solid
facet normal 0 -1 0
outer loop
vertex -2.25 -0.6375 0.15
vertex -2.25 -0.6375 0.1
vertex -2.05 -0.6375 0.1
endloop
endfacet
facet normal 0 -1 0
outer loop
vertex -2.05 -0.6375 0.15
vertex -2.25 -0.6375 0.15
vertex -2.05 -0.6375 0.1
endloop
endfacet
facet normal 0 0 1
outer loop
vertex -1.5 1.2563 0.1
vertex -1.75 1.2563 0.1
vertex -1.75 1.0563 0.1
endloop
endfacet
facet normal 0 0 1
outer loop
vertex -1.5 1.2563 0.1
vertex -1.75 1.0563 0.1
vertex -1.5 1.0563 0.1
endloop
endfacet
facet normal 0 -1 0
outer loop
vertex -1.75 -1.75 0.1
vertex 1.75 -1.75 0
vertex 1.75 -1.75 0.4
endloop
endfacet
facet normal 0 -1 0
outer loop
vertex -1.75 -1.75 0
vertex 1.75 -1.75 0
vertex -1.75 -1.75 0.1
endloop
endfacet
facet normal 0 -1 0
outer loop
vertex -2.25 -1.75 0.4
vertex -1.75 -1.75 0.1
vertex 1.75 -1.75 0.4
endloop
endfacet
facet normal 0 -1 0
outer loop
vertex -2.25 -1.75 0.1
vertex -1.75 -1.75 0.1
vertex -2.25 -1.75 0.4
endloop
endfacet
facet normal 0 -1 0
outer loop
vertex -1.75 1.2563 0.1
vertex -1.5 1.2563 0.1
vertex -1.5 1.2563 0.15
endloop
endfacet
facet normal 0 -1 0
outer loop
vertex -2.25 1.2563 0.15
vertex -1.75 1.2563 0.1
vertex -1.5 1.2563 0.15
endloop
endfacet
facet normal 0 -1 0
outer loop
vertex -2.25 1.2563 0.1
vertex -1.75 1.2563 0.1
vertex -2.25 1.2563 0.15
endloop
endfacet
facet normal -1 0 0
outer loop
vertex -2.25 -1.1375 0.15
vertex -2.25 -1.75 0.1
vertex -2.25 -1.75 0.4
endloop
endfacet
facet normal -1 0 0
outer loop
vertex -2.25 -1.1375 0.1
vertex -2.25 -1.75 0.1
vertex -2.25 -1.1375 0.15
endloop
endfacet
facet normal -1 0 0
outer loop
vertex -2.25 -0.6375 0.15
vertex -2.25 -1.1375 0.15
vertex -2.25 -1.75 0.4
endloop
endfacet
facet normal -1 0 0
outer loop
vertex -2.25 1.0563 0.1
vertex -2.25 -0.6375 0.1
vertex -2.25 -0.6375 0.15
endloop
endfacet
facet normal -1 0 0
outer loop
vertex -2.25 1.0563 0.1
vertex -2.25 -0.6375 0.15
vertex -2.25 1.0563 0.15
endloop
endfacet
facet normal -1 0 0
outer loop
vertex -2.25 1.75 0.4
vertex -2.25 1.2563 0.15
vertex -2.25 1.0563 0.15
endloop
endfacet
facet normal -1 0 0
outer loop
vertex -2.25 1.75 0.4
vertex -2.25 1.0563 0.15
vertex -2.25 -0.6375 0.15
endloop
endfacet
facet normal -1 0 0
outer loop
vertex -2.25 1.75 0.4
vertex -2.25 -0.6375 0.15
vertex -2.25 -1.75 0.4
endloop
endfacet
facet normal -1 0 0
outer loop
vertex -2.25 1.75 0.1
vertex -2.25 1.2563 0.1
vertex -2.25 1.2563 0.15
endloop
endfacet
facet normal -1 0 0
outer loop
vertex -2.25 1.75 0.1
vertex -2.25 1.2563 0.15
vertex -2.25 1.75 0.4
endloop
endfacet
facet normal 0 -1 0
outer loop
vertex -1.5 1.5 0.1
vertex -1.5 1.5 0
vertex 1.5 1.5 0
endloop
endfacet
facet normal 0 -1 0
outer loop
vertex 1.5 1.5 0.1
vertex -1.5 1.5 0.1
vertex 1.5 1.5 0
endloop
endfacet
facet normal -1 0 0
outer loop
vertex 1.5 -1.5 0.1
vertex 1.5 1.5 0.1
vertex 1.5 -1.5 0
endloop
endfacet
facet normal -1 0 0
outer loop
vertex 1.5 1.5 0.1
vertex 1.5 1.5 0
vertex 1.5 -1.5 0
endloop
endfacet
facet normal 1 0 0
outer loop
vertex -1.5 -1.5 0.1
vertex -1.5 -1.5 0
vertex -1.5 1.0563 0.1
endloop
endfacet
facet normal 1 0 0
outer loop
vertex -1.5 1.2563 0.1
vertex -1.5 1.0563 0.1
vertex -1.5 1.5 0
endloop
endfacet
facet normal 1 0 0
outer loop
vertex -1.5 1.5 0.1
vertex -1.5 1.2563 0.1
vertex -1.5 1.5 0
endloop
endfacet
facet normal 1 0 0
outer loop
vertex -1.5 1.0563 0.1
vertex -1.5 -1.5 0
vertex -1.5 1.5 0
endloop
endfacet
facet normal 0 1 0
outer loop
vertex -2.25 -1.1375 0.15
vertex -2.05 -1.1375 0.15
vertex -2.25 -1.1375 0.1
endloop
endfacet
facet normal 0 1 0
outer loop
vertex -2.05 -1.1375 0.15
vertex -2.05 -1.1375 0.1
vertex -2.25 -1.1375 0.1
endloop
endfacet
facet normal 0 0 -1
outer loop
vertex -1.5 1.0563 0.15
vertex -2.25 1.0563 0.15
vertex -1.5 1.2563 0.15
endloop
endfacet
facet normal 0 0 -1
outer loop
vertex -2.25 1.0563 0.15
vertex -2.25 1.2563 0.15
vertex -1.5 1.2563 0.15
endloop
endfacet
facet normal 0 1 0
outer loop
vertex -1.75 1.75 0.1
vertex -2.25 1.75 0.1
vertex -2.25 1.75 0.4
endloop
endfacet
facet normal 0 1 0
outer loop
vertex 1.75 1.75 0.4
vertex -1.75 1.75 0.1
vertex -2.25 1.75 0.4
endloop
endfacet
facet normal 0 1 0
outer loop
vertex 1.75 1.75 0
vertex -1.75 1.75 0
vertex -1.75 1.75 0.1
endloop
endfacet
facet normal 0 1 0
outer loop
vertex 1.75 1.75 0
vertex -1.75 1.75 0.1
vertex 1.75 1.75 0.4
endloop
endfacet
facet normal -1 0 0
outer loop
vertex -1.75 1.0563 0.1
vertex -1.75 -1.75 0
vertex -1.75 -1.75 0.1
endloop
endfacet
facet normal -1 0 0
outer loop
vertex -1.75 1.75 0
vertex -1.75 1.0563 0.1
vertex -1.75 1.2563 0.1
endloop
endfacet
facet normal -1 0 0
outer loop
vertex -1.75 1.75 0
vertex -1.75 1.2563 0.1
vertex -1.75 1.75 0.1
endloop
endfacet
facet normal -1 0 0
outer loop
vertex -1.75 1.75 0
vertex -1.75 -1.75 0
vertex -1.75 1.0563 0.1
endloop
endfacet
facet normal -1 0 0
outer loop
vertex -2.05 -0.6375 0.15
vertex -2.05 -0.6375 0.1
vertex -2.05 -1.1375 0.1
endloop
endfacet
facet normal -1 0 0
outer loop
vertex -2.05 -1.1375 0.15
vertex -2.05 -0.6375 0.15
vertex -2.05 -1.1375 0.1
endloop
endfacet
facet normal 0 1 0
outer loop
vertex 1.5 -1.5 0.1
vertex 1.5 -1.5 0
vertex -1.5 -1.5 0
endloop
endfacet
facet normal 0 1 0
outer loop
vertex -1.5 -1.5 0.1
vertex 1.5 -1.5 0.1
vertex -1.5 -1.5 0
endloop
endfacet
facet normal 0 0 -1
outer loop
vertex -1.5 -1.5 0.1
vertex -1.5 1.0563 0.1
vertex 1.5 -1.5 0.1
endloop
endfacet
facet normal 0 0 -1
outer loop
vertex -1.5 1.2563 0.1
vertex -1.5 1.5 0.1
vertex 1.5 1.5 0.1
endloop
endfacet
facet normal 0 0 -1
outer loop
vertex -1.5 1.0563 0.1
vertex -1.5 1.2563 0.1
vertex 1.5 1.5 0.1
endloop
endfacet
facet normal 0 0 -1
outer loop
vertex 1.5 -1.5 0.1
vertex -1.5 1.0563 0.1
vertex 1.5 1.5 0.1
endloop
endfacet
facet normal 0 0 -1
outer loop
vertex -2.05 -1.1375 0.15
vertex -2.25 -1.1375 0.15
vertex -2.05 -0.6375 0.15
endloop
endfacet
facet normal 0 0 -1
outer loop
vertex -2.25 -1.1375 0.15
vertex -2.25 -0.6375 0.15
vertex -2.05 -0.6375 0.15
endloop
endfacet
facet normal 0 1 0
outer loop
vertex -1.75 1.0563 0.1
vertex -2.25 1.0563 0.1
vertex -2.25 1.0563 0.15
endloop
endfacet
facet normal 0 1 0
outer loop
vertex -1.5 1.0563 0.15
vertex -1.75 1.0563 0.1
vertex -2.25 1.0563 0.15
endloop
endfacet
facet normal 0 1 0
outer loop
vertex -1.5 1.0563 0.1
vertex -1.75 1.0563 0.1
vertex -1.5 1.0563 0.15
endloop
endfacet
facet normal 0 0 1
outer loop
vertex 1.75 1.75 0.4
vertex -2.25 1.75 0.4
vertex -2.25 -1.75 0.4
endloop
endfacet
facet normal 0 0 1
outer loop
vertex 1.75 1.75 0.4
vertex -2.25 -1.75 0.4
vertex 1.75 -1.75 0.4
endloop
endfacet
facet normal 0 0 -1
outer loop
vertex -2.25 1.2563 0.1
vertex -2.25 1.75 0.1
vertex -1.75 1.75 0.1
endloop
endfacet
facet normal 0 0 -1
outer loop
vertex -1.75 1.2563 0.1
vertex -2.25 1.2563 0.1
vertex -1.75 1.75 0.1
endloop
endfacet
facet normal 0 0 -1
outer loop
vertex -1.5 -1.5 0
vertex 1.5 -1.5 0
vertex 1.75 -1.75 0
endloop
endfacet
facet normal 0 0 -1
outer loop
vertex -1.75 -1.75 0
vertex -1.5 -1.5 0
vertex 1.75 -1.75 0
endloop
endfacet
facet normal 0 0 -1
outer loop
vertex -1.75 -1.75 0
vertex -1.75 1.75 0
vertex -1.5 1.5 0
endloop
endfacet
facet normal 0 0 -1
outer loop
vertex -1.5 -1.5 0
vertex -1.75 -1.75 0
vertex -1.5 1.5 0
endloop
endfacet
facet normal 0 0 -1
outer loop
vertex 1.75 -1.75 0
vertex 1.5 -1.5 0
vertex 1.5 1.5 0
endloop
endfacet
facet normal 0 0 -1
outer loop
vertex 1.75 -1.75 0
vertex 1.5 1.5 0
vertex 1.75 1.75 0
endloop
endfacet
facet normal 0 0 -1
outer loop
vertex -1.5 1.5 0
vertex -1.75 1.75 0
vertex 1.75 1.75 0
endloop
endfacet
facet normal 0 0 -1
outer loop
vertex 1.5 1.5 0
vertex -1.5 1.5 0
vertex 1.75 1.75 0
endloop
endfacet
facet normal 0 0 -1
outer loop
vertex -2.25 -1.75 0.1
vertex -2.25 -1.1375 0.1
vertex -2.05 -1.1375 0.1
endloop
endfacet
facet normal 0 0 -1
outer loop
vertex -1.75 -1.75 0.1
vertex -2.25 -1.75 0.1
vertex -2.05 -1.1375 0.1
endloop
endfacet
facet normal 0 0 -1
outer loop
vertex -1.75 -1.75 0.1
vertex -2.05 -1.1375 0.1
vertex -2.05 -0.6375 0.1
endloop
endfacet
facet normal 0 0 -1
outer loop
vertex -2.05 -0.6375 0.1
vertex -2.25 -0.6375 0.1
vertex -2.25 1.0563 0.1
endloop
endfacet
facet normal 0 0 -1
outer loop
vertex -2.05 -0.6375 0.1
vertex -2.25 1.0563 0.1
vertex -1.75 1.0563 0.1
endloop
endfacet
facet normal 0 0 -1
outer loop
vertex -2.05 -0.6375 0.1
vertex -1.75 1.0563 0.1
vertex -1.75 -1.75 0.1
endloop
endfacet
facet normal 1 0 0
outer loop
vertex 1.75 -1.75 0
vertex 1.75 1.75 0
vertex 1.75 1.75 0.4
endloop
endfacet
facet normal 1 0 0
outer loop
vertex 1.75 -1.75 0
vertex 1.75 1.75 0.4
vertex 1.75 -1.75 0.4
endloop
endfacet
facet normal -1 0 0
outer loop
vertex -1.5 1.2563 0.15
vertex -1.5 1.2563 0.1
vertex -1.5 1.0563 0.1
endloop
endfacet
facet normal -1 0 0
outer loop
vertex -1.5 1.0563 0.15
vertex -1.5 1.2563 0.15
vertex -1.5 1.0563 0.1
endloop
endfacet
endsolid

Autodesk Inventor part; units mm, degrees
sketch "Sketch1" plane through (0, 0, 0) normal (0, 0, 1) x (1, 0, 0)
  line L0 (-1.5, 1.5) -> (1.5, 1.5) projected
  line L1 (1.5, 1.5) -> (1.5, -1.5) projected
  line L2 (1.5, -1.5) -> (-1.5, -1.5) projected
  line L3 (-1.5, -1.5) -> (-1.5, 1.5) projected
  line L4 (-1.75, -1.75) -> (-1.75, 1.75) projected
  line L5 (1.75, -1.75) -> (-1.75, -1.75) projected
  line L6 (1.75, 1.75) -> (1.75, -1.75) projected
  line L7 (-1.75, 1.75) -> (1.75, 1.75) projected
  point P0 (0, 0)
ref_plane "Work Plane1" through (-2.25, -1.75, 0.1) normal (0, 0, 1) x (1, 0, 0)
extrude "Extrusion1" add sketch "Sketch1" along normal up to surface (0.1 mm away)
sketch "Sketch2" plane through (-1.75, 1.75, 0.1) normal (0, 0, 1) x (1, 0, 0)
  line L0 (-0.5, -0.4937) -> (0, -0.4937) projected
  line L1 (0, 0) -> (0, -0.4937) projected
  line L2 (-0.5, 0) -> (0, 0) projected
  line L3 (-0.5, -0.4937) -> (-0.5, 0) projected
  line L4 (-0.5, -2.3875) -> (-0.3, -2.3875) projected
  line L5 (-0.3, -2.3875) -> (-0.3, -2.8875) projected
  line L6 (-0.3, -2.8875) -> (-0.5, -2.8875) projected
  line L7 (-0.5, -3.5) -> (-0.5, -2.8875) projected
  line L8 (0, -3.5) -> (-0.5, -3.5) projected
  line L9 (0, -0.6937) -> (0, -3.5) projected
  line L10 (0, -0.6937) -> (-0.5, -0.6937) projected
  line L11 (-0.5, -2.3875) -> (-0.5, -0.6937) projected
  line L12 (0.25, -0.25) -> (0.25, -0.4937) projected
  line L13 (0.25, -0.4937) -> (0.25, -0.6937) projected
  line L14 (0.25, -0.6937) -> (0.25, -3.25) projected
  line L15 (0.25, -3.25) -> (3.25, -3.25) projected
  line L16 (3.25, -3.25) -> (3.25, -0.25) projected
  line L17 (3.25, -0.25) -> (0.25, -0.25) projected
  point P0 (1.75, -1.75)
ref_plane "Work Plane2" through (-2.25, 1.0563, 0.15) normal (0, 0, 1) x (1, 0, 0)
extrude "Extrusion2" add sketch "Sketch2" along normal up to surface (0.05 mm away)
sketch "Sketch3" plane through (1.75, -1.75, 0.1) normal (0, 0, 1) x (1, 0, 0)
  line L0 (-4, 2.8063) -> (-4, 3.0063) projected
  line L1 (-4, 2.8063) -> (-3.25, 2.8063) projected
  line L2 (-3.25, 2.8063) -> (-3.25, 3.0063) projected
  line L3 (-3.25, 3.0063) -> (-4, 3.0063) projected
  line L4 (-0.25, 0.25) -> (-0.25, 3.25) projected
  line L5 (-3.25, 0.25) -> (-0.25, 0.25) projected
  line L6 (-3.25, 3.25) -> (-3.25, 0.25) projected
  line L7 (-0.25, 3.25) -> (-3.25, 3.25) projected
  line L8 (-3.5, 3.5) -> (0, 3.5) projected
  line L9 (-3.5, 3.0063) -> (-3.5, 3.5) projected
  line L10 (-3.5, 2.8063) -> (-3.5, 3.0063) projected
  line L11 (-3.5, 0) -> (-3.5, 2.8063) projected
  line L12 (0, 0) -> (-3.5, 0) projected
  line L13 (0, 3.5) -> (0, 0) projected
  line L14 (-3.5, 3.0063) -> (-3.25, 3.0063)
  line L15 (-3.5, 2.8063) -> (-3.25, 2.8063)
  point P0 (-1.75, 1.75)
extrude "Extrusion3" add sketch "Sketch3" along normal up to surface (0.05 mm away) contours L1 L6 L5 L4 L7 L3 L9 L8 L13 L12 L11
sketch "Sketch4" plane through (-2.25, -1.75, 0.15) normal (0, 0, 1) x (1, 0, 0)
  line L0 (0, 1.1125) -> (0, 2.8063) projected
  line L1 (0.2, 1.1125) -> (0, 1.1125) projected
  line L2 (0.2, 0.6125) -> (0.2, 1.1125) projected
  line L3 (0, 0.6125) -> (0.2, 0.6125) projected
  line L4 (0, 0) -> (0, 0.6125) projected
  line L5 (4, 0) -> (0, 0) projected
  line L6 (4, 3.5) -> (4, 0) projected
  line L7 (0, 3.5) -> (4, 3.5) projected
  line L8 (0, 3.0063) -> (0, 3.5) projected
  line L9 (0.75, 3.0063) -> (0, 3.0063) projected
  line L10 (0.75, 2.8063) -> (0.75, 3.0063) projected
  line L11 (0, 2.8063) -> (0.75, 2.8063) projected
  line L12 (0, 2.8063) -> (0, 3.0063) projected
  line L13 (0, 2.8063) -> (0.75, 2.8063) projected
  line L14 (0.75, 2.8063) -> (0.75, 3.0063) projected
  line L15 (0.75, 3.0063) -> (0, 3.0063) projected
  line L16 (0, 0.6125) -> (0, 1.1125) projected
  line L17 (0, 0.6125) -> (0.2, 0.6125) projected
  line L18 (0.2, 0.6125) -> (0.2, 1.1125) projected
  line L19 (0.2, 1.1125) -> (0, 1.1125) projected
  point P0 (2.25, 1.75)
ref_plane "Work Plane3" through (-2.425, -1.925, 0.4) normal (0, 0, 1) x (1, 0, 0)
extrude "Extrusion4" add sketch "Sketch4" along normal up to surface (0.25 mm away)
properties part number "lens" material "Glass"
